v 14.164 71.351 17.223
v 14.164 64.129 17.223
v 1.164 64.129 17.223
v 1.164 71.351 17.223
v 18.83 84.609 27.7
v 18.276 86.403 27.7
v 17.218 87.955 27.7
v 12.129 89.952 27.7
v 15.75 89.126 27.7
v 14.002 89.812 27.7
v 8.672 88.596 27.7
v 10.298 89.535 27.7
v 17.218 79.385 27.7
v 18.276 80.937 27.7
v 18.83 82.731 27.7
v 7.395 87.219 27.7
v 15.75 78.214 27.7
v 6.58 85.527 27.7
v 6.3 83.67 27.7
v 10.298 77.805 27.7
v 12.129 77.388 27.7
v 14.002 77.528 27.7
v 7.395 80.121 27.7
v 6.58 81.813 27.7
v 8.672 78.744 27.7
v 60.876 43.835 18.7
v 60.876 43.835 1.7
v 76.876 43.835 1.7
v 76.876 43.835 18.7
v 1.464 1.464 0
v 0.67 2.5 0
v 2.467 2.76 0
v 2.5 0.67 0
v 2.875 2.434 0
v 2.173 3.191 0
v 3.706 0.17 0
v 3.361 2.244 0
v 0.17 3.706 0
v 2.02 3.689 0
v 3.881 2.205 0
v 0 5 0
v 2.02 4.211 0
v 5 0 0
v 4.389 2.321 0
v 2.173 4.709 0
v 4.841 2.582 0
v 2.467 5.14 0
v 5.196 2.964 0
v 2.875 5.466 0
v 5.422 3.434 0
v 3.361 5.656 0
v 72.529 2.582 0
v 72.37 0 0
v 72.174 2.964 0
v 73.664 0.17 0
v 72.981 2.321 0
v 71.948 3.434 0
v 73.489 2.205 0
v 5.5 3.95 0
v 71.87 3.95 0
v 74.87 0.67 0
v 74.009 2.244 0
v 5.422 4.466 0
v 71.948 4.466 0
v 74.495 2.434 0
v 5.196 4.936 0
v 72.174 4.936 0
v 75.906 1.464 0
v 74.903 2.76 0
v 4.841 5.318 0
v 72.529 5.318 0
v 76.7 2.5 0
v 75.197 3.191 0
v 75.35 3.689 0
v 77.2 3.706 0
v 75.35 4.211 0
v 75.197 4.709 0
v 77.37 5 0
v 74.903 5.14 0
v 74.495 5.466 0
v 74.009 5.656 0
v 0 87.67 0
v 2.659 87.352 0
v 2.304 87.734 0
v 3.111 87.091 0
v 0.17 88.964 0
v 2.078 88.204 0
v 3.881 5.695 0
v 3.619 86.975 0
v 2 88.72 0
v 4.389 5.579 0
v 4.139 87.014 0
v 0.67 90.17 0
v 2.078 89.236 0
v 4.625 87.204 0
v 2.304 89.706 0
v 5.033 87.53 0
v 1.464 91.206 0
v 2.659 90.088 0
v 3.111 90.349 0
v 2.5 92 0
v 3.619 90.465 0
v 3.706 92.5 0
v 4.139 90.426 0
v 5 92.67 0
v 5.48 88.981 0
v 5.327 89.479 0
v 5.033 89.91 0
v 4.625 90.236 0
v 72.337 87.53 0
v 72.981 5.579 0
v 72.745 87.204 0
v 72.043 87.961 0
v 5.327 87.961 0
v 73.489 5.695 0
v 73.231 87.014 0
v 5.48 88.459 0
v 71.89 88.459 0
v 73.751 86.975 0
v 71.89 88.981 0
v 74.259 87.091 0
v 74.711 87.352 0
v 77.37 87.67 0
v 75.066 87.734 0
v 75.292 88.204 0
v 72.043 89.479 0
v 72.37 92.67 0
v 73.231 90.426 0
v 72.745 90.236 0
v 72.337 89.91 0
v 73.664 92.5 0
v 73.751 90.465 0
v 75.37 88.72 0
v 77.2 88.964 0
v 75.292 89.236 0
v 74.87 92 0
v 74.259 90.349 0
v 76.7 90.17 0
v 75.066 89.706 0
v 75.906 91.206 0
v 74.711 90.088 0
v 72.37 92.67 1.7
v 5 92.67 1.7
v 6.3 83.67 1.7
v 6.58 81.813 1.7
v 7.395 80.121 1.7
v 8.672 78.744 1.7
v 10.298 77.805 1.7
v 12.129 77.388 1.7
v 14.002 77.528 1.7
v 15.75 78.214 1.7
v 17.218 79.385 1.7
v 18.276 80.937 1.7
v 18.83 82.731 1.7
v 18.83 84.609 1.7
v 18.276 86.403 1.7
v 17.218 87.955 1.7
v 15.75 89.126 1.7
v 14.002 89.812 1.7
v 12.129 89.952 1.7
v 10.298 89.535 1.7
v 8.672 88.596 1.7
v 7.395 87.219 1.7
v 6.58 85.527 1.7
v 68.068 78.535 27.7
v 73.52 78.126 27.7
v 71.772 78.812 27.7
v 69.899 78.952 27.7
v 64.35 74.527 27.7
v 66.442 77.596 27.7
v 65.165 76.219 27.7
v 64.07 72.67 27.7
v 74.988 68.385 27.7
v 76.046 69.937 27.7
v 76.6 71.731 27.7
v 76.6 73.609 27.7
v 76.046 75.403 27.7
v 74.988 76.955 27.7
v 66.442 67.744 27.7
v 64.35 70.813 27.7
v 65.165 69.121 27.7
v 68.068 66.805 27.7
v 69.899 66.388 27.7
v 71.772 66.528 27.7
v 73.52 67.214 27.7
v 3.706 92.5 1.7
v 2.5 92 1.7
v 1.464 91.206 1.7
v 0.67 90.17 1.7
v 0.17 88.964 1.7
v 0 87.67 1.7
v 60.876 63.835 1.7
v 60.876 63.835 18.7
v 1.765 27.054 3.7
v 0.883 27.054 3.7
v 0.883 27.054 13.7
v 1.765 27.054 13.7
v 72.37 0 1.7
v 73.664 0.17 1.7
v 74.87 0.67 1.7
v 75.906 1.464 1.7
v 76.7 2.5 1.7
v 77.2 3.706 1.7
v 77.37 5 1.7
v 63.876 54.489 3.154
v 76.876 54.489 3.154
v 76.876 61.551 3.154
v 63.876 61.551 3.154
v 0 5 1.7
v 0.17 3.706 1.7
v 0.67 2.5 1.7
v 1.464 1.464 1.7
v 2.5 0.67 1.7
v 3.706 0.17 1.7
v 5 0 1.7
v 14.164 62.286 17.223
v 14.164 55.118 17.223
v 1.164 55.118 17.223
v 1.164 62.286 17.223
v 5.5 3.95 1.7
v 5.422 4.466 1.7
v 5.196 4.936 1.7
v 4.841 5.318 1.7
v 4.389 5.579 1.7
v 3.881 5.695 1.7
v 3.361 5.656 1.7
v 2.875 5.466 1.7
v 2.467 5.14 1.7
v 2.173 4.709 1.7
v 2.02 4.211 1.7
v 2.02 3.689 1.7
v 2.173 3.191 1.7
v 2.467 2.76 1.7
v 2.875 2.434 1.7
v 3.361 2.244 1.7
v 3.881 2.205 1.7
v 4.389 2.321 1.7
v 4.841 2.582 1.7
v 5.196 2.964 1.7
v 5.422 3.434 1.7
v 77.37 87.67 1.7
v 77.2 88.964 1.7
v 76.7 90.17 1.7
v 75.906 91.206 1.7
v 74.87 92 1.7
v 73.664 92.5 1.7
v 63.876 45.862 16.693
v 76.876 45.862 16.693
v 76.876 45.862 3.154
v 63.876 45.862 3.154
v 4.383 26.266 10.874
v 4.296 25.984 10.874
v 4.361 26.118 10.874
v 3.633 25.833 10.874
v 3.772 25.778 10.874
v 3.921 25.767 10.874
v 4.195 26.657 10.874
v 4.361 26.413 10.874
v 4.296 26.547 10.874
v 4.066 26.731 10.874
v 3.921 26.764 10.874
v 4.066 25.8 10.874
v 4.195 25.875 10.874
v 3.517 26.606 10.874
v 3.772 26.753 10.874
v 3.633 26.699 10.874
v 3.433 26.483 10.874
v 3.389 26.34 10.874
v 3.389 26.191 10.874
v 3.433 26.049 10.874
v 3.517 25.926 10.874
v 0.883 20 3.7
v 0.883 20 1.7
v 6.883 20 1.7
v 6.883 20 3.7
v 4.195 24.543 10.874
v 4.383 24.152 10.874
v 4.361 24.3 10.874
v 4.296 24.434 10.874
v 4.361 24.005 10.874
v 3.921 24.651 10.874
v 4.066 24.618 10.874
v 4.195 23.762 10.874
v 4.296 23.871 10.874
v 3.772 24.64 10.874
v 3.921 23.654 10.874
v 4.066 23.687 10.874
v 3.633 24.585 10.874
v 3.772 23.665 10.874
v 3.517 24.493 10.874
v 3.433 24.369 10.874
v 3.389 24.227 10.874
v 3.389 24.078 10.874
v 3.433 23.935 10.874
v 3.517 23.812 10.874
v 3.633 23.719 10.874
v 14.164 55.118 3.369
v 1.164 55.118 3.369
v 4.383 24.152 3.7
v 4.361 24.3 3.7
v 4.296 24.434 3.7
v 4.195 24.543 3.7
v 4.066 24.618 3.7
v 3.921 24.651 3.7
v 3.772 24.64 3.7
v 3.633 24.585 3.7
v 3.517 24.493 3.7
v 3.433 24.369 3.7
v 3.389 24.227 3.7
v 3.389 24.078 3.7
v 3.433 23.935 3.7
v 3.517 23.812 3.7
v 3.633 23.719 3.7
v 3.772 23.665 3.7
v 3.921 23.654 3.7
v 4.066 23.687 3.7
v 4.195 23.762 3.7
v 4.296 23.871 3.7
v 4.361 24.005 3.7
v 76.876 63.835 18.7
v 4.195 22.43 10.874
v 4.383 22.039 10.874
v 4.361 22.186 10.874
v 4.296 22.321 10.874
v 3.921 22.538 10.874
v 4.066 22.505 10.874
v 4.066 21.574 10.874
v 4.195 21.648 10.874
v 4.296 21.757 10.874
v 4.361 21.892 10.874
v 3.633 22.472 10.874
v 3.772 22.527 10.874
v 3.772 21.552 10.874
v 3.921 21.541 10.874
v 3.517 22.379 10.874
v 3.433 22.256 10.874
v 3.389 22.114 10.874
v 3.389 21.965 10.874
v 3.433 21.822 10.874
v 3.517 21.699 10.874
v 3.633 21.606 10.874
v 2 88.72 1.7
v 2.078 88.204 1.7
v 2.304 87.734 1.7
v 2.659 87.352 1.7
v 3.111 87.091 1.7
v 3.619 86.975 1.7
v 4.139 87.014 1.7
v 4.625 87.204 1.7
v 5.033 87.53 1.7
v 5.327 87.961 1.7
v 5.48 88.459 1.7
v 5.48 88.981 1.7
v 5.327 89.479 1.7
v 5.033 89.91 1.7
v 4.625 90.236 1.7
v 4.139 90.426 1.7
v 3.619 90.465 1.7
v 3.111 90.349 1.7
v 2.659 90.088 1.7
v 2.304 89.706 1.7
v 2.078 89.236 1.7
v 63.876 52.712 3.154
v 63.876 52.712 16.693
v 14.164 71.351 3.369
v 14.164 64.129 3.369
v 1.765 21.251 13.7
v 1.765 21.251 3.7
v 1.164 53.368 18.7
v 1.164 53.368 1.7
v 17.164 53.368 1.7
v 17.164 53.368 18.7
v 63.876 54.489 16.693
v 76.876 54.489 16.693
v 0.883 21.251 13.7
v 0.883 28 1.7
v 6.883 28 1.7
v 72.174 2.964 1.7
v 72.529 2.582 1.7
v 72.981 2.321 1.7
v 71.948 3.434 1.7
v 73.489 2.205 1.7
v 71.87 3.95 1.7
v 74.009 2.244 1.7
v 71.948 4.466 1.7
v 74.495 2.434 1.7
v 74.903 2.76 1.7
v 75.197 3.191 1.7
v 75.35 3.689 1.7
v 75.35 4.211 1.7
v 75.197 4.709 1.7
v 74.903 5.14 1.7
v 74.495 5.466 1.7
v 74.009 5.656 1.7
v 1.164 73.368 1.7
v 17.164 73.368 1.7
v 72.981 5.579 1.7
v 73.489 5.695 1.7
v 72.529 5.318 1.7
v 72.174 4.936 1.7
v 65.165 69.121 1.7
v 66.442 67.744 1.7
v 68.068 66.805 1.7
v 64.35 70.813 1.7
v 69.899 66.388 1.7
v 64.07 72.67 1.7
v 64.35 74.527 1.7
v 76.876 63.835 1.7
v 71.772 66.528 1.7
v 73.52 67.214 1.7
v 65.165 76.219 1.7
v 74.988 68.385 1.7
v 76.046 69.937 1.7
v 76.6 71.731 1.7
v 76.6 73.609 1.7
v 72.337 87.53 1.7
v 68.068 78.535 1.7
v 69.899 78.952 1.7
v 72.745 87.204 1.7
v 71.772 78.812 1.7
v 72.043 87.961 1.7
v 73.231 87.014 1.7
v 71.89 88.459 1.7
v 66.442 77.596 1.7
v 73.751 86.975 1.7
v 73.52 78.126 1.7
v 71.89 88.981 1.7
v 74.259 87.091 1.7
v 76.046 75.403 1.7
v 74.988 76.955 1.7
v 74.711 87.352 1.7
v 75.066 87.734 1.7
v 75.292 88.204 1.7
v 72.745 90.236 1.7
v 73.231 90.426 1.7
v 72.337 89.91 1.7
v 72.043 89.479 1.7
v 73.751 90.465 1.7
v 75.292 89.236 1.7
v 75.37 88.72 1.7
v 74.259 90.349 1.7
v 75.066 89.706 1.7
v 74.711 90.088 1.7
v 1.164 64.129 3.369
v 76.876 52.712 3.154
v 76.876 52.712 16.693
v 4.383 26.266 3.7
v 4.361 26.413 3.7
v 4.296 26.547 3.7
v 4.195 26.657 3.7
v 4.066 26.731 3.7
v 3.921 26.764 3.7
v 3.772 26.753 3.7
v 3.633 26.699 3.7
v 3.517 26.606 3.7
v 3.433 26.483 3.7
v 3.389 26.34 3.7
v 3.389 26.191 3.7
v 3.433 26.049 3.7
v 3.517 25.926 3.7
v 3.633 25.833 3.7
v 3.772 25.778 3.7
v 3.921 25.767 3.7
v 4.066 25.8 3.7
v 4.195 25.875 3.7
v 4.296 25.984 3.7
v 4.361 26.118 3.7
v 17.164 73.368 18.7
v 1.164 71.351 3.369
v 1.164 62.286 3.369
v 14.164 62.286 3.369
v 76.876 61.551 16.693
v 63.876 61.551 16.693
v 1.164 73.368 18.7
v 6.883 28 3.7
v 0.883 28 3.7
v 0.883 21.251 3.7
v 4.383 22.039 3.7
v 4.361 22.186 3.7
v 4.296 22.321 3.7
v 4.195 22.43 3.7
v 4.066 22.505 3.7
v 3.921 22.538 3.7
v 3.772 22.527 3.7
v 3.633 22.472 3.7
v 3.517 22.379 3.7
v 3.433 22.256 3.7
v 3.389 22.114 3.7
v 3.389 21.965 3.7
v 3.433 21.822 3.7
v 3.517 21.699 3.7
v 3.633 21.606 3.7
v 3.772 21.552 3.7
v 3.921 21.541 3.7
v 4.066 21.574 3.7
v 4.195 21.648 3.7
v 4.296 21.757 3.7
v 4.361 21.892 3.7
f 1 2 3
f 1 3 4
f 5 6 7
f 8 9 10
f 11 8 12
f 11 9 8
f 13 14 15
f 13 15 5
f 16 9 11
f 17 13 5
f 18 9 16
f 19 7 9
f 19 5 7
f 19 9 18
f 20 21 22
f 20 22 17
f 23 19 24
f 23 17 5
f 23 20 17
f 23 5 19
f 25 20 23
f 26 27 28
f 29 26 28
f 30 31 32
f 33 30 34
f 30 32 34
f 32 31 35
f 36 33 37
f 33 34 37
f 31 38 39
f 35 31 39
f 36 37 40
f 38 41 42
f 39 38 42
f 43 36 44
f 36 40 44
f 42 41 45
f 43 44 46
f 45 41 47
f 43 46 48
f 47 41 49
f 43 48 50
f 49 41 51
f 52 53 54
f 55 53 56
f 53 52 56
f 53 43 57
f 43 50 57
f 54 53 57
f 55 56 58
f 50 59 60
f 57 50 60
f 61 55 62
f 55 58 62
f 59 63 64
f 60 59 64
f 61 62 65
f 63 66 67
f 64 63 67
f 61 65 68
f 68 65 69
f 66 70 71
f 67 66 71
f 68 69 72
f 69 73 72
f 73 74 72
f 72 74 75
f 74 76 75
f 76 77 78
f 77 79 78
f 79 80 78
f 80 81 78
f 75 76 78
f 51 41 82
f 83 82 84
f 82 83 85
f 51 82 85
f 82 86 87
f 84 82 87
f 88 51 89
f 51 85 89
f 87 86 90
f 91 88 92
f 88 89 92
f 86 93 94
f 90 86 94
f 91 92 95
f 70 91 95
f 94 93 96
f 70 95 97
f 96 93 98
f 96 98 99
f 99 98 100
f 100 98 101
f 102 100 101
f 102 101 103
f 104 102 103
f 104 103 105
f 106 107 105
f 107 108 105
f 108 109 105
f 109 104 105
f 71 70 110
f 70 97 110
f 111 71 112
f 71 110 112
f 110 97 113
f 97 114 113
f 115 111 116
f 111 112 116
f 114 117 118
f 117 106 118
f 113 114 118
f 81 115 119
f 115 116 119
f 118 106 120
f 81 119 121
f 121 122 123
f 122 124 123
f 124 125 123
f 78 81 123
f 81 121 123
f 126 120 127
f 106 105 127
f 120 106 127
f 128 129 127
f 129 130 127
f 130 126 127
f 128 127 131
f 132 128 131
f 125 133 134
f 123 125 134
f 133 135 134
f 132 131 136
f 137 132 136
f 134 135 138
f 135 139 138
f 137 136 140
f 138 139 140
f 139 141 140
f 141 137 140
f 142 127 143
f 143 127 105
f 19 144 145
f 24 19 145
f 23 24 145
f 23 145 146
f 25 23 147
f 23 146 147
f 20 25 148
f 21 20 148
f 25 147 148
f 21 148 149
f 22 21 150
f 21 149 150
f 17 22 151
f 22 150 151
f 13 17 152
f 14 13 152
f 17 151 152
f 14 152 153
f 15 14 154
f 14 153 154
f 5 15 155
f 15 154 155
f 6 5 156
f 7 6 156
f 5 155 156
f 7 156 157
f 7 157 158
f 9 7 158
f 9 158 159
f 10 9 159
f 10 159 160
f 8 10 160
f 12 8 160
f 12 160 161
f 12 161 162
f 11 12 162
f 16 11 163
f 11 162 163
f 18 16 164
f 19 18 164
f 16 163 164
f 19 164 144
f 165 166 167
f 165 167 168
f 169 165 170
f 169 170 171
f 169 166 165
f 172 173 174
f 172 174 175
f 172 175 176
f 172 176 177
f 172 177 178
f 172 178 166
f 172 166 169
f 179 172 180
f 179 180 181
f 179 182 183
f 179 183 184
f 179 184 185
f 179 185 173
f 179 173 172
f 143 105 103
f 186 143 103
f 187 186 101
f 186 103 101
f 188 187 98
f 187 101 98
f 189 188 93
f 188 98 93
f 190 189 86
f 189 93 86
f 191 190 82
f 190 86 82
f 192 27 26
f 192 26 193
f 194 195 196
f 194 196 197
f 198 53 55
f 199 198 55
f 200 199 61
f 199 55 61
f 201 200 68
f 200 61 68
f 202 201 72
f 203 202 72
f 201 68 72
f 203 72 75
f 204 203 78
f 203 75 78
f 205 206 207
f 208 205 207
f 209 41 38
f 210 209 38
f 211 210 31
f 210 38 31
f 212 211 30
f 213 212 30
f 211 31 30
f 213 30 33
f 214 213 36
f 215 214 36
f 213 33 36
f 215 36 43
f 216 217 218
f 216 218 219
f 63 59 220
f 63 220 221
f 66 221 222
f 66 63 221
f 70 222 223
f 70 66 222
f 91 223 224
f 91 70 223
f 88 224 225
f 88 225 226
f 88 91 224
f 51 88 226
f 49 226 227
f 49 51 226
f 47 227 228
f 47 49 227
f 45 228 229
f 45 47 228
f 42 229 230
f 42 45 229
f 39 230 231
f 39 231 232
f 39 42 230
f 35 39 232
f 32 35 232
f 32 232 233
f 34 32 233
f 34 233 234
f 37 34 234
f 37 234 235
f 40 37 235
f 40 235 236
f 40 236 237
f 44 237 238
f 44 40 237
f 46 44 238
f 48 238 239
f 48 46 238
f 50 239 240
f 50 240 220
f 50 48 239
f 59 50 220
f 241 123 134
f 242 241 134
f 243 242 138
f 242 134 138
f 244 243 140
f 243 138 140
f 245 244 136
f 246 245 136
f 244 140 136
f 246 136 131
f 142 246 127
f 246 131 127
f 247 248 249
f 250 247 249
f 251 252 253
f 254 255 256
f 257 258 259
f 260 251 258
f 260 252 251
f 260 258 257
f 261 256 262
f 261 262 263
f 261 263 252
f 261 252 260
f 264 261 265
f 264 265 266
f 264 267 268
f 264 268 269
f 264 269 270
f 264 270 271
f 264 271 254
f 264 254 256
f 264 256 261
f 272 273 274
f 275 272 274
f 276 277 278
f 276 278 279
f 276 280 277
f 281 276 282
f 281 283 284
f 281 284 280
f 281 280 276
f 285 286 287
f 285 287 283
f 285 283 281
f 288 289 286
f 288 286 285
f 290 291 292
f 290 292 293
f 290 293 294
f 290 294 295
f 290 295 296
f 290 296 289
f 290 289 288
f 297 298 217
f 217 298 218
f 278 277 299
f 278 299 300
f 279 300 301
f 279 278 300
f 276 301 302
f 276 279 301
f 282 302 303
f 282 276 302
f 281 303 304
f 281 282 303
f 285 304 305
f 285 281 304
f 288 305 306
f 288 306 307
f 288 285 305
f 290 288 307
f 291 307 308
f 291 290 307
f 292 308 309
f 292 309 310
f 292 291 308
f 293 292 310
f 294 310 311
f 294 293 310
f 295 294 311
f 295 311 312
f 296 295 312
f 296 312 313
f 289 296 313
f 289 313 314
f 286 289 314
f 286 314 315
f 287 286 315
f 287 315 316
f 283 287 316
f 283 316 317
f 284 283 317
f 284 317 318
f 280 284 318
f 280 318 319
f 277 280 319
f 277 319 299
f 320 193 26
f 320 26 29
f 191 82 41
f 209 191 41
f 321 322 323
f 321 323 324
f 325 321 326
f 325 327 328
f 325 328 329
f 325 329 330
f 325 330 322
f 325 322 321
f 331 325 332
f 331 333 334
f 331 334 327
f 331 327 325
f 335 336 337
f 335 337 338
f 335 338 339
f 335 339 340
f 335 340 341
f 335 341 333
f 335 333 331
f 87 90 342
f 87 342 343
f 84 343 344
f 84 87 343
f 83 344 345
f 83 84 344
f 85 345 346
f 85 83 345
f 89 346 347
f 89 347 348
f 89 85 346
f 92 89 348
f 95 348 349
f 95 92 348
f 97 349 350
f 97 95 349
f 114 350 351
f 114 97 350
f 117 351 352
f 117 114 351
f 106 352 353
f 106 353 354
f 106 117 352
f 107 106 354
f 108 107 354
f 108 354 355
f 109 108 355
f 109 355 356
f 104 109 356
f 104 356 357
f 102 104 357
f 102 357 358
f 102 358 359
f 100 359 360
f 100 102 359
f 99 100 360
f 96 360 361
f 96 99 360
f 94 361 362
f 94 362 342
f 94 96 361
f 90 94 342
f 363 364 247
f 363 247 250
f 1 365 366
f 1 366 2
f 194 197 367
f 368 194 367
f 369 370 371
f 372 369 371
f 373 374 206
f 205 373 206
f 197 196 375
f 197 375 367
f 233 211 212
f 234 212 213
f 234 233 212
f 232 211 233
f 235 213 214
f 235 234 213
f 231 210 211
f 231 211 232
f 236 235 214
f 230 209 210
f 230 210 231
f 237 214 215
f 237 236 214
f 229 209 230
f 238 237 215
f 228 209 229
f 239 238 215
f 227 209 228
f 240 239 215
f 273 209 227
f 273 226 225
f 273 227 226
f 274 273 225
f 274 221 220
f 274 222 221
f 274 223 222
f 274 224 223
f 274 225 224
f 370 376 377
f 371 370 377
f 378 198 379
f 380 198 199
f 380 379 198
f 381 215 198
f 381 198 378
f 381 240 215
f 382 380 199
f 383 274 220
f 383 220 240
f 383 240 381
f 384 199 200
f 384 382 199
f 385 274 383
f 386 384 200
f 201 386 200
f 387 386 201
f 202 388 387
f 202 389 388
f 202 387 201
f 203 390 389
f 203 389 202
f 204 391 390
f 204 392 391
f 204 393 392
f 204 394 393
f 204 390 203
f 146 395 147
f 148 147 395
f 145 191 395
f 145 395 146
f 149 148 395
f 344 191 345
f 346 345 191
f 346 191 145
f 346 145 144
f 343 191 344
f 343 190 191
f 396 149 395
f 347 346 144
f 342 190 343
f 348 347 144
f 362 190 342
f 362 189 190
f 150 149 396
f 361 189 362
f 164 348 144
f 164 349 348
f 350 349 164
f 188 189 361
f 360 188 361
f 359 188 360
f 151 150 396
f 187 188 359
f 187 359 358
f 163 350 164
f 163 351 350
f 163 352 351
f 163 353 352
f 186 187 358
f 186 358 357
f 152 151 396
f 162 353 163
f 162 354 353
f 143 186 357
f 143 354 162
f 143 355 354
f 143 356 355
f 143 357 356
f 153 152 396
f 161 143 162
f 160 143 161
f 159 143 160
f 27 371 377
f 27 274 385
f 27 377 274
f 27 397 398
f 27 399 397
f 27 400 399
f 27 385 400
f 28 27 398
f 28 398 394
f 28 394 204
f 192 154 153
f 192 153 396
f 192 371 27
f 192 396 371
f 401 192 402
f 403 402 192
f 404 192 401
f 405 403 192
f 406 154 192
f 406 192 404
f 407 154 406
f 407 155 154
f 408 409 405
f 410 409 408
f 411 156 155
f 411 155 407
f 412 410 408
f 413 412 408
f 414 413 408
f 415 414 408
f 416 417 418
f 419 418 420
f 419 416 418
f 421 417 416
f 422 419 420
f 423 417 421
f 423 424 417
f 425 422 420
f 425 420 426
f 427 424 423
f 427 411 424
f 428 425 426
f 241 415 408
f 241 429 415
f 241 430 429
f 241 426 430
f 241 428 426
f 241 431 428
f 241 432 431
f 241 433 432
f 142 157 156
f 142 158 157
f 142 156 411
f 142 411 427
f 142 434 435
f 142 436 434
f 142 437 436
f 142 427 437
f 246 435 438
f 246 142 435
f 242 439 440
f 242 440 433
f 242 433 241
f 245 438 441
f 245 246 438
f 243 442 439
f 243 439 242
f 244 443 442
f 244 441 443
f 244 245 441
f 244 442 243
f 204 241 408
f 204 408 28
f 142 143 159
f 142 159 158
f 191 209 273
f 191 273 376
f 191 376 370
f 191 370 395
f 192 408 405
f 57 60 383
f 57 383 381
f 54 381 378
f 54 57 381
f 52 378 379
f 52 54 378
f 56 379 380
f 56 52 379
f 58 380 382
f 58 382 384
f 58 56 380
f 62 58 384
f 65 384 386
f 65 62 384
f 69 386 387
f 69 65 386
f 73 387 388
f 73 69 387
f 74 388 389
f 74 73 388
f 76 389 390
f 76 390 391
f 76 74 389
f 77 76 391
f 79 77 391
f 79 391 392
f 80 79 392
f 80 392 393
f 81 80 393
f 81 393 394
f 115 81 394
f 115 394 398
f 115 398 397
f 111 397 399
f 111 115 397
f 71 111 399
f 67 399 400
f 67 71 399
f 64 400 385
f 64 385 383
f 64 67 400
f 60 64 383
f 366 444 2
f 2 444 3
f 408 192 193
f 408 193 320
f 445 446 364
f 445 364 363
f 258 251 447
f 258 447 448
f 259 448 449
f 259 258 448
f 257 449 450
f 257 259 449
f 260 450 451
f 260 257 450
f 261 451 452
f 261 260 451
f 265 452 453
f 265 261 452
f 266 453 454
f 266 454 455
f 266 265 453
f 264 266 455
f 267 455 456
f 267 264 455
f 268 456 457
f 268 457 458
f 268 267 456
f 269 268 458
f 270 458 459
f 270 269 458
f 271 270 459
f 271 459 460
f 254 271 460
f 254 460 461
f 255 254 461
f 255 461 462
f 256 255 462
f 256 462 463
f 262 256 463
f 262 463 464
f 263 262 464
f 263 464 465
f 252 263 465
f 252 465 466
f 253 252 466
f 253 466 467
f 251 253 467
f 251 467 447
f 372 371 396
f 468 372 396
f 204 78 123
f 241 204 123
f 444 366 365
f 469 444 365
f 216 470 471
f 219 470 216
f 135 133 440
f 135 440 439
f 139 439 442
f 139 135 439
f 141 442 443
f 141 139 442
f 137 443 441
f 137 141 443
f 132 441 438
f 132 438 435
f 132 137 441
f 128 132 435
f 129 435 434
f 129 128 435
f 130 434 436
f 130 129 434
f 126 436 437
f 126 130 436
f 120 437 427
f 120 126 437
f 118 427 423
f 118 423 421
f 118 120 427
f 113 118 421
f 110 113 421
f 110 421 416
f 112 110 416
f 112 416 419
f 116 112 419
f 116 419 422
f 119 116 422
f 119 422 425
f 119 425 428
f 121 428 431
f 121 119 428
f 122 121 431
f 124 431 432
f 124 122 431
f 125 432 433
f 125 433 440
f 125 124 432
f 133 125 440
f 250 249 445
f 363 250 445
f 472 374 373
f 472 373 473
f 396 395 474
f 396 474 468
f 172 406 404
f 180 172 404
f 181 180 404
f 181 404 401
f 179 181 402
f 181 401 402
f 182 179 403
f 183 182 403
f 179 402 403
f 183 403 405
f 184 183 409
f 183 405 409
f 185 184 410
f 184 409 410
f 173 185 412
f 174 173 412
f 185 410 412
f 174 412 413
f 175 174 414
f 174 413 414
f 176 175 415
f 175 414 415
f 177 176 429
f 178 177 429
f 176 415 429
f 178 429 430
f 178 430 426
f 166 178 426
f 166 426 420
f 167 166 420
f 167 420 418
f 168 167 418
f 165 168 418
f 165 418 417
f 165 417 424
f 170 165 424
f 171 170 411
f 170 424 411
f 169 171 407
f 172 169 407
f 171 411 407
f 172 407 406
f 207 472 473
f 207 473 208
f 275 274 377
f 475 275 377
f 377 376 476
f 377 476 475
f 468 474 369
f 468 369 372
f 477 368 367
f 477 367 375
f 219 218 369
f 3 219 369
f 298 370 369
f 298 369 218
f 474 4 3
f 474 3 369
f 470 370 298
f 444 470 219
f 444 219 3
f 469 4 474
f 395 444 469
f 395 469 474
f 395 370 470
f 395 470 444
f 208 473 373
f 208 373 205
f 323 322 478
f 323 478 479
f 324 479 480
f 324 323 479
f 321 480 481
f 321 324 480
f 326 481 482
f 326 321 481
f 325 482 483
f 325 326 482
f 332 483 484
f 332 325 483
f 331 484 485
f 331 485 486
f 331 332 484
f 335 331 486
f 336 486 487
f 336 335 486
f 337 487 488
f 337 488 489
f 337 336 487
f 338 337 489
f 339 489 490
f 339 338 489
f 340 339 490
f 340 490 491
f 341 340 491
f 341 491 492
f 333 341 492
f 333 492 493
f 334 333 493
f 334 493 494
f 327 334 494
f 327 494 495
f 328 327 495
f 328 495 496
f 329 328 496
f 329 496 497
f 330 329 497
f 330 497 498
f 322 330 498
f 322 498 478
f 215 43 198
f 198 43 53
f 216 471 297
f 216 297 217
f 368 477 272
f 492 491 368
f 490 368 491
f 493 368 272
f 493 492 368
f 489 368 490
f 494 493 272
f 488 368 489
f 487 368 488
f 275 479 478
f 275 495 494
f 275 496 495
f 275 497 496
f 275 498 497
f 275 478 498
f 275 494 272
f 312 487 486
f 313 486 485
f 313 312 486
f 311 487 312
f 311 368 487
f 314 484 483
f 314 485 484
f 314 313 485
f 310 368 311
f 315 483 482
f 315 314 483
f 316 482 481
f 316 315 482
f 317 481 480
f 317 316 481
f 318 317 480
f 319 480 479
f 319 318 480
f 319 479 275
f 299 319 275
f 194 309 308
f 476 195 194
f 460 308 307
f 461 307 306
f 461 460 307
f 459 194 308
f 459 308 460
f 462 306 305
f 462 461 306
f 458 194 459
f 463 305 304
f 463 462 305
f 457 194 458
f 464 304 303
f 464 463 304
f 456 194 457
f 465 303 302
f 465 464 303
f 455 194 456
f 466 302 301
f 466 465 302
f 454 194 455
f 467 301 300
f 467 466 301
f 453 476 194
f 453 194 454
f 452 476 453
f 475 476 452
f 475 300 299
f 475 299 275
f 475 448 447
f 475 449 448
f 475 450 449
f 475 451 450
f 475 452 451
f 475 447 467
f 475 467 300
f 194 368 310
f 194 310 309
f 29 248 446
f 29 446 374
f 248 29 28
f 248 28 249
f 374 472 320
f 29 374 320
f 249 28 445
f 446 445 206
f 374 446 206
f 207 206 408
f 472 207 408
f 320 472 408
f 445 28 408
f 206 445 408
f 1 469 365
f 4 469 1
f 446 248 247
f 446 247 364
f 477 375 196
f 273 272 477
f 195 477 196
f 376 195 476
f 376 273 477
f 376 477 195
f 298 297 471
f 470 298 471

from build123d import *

# Parameters (mm, degrees)
SKETCH1_R           = 1.75
BOSS_EXTRUDE1_DEPTH = 1.7
SKETCH2_R           = 6.3
BOSS_EXTRUDE2_DEPTH = 26
SKETCH3_W           = 16
SKETCH3_H           = 20
BOSS_EXTRUDE3_DEPTH = 17
SKETCH4_W           = 13.854016079
SKETCH4_H           = 7.22206482
SKETCH4_H_2         = 7.167084928
CUT_EXTRUDE1_DEPTH  = 13
SKETCH5_W           = 13.539526547
SKETCH5_H           = 7.062187725
SKETCH5_H_2         = 6.849826242
CUT_EXTRUDE2_DEPTH  = 13
SKETCH6_W           = 6
SKETCH6_H           = 8
BOSS_EXTRUDE5_DEPTH = 12
SKETCH7_R           = 0.5
CUT_EXTRUDE3_DEPTH  = 10
SKETCH8_W           = 2.826271855
SKETCH8_H           = 5.802654235
CUT_EXTRUDE4_DEPTH  = 123.76480237


with BuildPart() as part:
    # Sketch1 → Boss-Extrude1 (new body)
    with BuildSketch(Plane.XY):
        with BuildLine():
            Line((5, 0), (72.37, 0))
            ThreePointArc((72.37, 0), (75.905533906, 1.464466094), (77.37, 5))
            Line((77.37, 5), (77.37, 87.67))
            ThreePointArc((77.37, 87.67), (75.905533906, 91.205533906), (72.37, 92.67))
            Line((72.37, 92.67), (5, 92.67))
            ThreePointArc((5, 92.67), (1.464466094, 91.205533906), (0, 87.67))
            Line((0, 87.67), (0, 5))
            ThreePointArc((0, 5), (1.464466094, 1.464466094), (5, 0))
        make_face()
        with Locations((73.62, 88.72)):
            Circle(SKETCH1_R, mode=Mode.SUBTRACT)
        with Locations(Location((3.75, 88.72, 0), (0, 0, 180))):
            Circle(SKETCH1_R, mode=Mode.SUBTRACT)
        with Locations((3.75, 3.95)):
            Circle(SKETCH1_R, mode=Mode.SUBTRACT)
        with Locations(Location((73.62, 3.95, 0), (0, 0, 180))):
            Circle(SKETCH1_R, mode=Mode.SUBTRACT)
    extrude(amount=BOSS_EXTRUDE1_DEPTH)

    # Sketch2 → Boss-Extrude2 (add)
    with BuildSketch(Plane.XY.offset(1.7)):
        with Locations(Location((12.6, 83.67, 0), (0, 0, 180))):
            Circle(SKETCH2_R)
        with Locations(Location((70.37, 72.67, 0), (0, 0, 180))):
            Circle(SKETCH2_R)
    extrude(amount=BOSS_EXTRUDE2_DEPTH)

    # Sketch3 → Boss-Extrude3 (add)
    with BuildSketch(Plane.XY.offset(1.7)):
        with Locations((68.875904293, 53.835144036)):
            Rectangle(SKETCH3_W, SKETCH3_H)
        with Locations((9.163906292, 63.368262293)):
            Rectangle(SKETCH3_W, SKETCH3_H)
    extrude(amount=BOSS_EXTRUDE3_DEPTH)

    # Sketch4 → Cut-Extrude1 (cut)
    with BuildSketch(Plane.ZY.offset(-1.163906292)):
        with Locations((10.29633171, 67.739791882)):
            Rectangle(SKETCH4_W, SKETCH4_H)
        with Locations((10.29633171, 58.701978818)):
            Rectangle(SKETCH4_W, SKETCH4_H_2)
    extrude(amount=-CUT_EXTRUDE1_DEPTH, mode=Mode.SUBTRACT)

    # Sketch5 → Cut-Extrude2 (cut)
    with BuildSketch(Plane(origin=(76.875904293, 0, 0), x_dir=(0, 0, -1), z_dir=(1, 0, 0))):
        with Locations((-9.923616317, 58.019849725)):
            Rectangle(SKETCH5_W, SKETCH5_H)
        with Locations((-9.923616317, 49.287198962)):
            Rectangle(SKETCH5_W, SKETCH5_H_2)
    extrude(amount=-CUT_EXTRUDE2_DEPTH, mode=Mode.SUBTRACT)

    # Sketch6 → Boss-Extrude5 (add)
    with BuildSketch(Plane.XY.offset(1.7)):
        with Locations((3.883233482, 24)):
            Rectangle(SKETCH6_W, SKETCH6_H)
    extrude(amount=BOSS_EXTRUDE5_DEPTH)

    # Sketch7 → Cut-Extrude3 (cut)
    with BuildSketch(Plane.XY.offset(13.7)):
        Polygon((6.883233482, 28), (0.883233482, 28), (0.883233482, 27.053748642), (1.764591458, 27.053748642), (1.764591458, 21.251094407), (0.883233482, 21.251094407), (0.883233482, 20), (6.883233482, 20), align=None)
        with Locations((3.883233482, 22.03910918)):
            Circle(SKETCH7_R, mode=Mode.SUBTRACT)
        with Locations((3.883233482, 24.152421525)):
            Circle(SKETCH7_R, mode=Mode.SUBTRACT)
        with Locations((3.883233482, 26.265733869)):
            Circle(SKETCH7_R, mode=Mode.SUBTRACT)
    extrude(amount=-CUT_EXTRUDE3_DEPTH, mode=Mode.SUBTRACT)

    # Sketch8 → Cut-Extrude4 (cut, through all)
    with BuildSketch(Plane(origin=(1.764591458, 0, 0), x_dir=(0, 0, -1), z_dir=(1, 0, 0))):
        with Locations((-12.286864073, 24.152421524)):
            Rectangle(SKETCH8_W, SKETCH8_H)
    extrude(amount=CUT_EXTRUDE4_DEPTH, mode=Mode.SUBTRACT)


solid = part.part
